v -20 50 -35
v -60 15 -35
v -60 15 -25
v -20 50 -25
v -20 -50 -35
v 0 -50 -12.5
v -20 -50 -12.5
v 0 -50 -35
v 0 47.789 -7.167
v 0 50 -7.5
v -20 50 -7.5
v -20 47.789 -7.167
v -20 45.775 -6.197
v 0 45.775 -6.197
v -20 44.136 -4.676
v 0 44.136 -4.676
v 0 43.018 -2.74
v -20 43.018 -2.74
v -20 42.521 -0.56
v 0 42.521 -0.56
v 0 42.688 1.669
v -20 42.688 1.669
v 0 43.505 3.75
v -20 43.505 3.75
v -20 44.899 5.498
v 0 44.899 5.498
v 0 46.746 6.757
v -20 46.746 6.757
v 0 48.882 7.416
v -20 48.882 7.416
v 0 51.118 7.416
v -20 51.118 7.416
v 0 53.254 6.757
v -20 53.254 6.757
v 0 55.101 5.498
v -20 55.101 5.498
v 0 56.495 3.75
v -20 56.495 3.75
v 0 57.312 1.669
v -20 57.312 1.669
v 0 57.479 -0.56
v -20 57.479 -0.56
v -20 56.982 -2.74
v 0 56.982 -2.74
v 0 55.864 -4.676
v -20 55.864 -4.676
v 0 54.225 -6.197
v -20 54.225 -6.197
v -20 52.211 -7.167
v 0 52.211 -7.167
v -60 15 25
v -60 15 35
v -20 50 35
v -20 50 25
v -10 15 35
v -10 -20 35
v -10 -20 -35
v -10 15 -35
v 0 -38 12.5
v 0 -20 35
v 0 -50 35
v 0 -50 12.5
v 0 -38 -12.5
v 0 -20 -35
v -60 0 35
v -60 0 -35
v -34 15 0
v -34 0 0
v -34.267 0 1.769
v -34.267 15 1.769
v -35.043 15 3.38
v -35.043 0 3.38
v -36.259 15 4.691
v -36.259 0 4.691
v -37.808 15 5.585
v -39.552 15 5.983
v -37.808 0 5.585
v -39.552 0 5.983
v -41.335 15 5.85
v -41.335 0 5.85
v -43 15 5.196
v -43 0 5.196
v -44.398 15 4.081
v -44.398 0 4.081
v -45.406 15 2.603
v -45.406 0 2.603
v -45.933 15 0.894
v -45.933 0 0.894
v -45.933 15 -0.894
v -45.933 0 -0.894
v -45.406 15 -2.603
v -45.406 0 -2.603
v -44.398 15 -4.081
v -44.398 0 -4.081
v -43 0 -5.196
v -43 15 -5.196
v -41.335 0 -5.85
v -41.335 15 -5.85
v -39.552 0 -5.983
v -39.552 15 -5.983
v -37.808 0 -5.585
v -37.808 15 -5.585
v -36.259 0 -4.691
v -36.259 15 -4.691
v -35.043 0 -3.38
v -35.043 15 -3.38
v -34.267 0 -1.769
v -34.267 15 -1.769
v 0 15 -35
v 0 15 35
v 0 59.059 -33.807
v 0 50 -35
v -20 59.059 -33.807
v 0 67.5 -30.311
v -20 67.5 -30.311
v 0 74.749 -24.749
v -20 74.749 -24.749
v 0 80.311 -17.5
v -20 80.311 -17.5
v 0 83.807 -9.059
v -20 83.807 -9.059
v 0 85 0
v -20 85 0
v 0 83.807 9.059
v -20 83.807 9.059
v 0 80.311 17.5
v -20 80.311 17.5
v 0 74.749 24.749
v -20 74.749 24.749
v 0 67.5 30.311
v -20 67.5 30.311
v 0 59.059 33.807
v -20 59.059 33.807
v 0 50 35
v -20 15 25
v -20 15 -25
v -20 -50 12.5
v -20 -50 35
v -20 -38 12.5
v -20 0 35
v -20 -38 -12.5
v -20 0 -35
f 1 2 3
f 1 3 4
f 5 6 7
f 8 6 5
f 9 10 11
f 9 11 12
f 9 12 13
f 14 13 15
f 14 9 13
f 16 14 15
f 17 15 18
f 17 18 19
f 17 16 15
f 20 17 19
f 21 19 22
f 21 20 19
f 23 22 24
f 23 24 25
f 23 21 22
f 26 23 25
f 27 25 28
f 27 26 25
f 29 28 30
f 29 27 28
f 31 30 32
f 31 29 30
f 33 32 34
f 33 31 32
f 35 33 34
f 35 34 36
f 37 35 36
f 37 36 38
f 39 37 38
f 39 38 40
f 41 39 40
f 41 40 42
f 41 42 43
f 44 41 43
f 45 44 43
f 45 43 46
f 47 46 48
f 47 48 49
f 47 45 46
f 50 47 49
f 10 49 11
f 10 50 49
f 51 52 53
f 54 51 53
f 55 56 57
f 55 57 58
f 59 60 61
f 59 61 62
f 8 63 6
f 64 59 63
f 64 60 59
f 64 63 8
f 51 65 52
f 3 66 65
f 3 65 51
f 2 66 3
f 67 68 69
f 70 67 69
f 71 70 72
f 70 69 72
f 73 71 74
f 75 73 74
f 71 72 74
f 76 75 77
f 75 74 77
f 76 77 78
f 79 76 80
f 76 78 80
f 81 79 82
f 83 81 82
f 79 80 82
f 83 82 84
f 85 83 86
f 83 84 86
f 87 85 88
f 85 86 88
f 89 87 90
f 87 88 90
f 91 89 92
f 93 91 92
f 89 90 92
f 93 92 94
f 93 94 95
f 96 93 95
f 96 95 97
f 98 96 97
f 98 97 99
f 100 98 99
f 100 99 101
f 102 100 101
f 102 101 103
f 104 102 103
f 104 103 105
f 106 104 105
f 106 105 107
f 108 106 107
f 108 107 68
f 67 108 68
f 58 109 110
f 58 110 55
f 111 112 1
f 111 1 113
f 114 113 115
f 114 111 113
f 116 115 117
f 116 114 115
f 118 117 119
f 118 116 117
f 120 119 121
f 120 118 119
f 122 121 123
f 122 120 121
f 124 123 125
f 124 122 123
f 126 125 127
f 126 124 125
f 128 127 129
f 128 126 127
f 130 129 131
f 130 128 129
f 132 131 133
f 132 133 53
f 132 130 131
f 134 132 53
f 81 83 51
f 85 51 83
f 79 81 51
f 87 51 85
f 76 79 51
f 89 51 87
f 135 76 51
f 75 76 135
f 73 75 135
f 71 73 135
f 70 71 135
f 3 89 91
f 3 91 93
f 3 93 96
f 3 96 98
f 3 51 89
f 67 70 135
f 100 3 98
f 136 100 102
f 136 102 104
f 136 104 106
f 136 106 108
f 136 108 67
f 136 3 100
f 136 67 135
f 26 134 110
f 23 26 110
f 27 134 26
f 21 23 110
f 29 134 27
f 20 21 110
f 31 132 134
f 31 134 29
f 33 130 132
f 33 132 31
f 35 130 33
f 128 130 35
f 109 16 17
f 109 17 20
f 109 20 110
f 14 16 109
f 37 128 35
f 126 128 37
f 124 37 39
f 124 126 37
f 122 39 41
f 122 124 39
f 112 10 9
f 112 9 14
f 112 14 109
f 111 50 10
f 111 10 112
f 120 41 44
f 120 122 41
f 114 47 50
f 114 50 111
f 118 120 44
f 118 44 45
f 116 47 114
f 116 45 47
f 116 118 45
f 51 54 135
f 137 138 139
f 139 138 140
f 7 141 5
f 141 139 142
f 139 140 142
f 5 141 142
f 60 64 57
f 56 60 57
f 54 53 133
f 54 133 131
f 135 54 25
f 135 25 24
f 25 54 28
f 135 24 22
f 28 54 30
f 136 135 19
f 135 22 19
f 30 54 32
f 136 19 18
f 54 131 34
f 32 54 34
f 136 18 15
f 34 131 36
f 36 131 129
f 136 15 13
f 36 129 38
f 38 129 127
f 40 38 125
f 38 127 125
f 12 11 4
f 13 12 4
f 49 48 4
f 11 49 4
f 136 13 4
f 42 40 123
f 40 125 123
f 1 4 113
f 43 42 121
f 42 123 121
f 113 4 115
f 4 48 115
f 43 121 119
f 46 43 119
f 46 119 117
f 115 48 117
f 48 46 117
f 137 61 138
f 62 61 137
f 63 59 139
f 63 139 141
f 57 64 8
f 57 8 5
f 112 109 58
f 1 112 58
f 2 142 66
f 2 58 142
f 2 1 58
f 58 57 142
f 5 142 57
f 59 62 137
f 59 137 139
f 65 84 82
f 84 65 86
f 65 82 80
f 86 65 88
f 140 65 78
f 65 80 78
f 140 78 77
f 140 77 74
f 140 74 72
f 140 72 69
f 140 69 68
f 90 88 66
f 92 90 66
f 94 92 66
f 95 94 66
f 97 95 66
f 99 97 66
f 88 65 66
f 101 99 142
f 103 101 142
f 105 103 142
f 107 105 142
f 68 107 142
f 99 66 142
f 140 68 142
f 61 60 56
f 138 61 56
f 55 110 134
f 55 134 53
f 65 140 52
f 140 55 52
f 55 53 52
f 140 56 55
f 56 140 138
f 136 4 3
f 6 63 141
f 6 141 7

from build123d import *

# Parameters (mm, degrees)
EXTRUDE_1_DEPTH     = 20
SKETCH_2_W          = 10
SKETCH_2_H          = 35
CUT_EXTRUDE_1_DEPTH = 112.915146428
EXTRUDE_START       = -35
SKETCH_3_W          = 40
SKETCH_3_H          = 15
EXTRUDE_2_DEPTH     = 70
SKETCH_4_R          = 6
CUT_EXTRUDE_2_DEPTH = 110.772492001
EXTRUDE_3_DEPTH     = 10


with BuildPart() as part:
    # Эскиз1 → Бобышка-Вытянуть1 (new body)
    with BuildSketch(Plane(origin=(0, 0, 0), x_dir=(0, 0, -1), z_dir=(1, 0, 0))):
        with BuildLine():
            Line((-35, 50), (-35, -50))
            Line((-35, -50), (-12.5, -50))
            Line((-12.5, -50), (-12.5, -38))
            Line((-12.5, -38), (12.5, -38))
            Line((12.5, -38), (12.5, -50))
            Line((12.5, -50), (35, -50))
            Line((35, -50), (35, 50))
            ThreePointArc((35, 50), (0, 15), (-35, 50))
        make_face()
        with BuildLine():
            ThreePointArc((35, 50), (0, 85), (-35, 50))
            Line((-35, 50), (-7.5, 50))
            ThreePointArc((-7.5, 50), (0, 57.5), (7.5, 50))
            Line((7.5, 50), (35, 50))
        make_face()
        with BuildLine():
            Line((-7.5, 50), (-35, 50))
            ThreePointArc((-35, 50), (0, 15), (35, 50))
            Line((35, 50), (7.5, 50))
            ThreePointArc((7.5, 50), (0, 42.5), (-7.5, 50))
        make_face()
    extrude(amount=-EXTRUDE_1_DEPTH)

    # Эскиз2 → Вырез-Вытянуть1 (cut, through all)
    with BuildSketch(Plane(origin=(0, 0, -35), x_dir=(-1, 0, 0), z_dir=(0, 0, -1))):
        with Locations((5, -2.5)):
            Rectangle(SKETCH_2_W, SKETCH_2_H)
    extrude(amount=-CUT_EXTRUDE_1_DEPTH, mode=Mode.SUBTRACT)

    # Эскиз3 → Бобышка-Вытянуть2 (add)
    with BuildSketch(Plane.XY.offset(EXTRUDE_START)):
        with Locations((-40, 7.5)):
            Rectangle(SKETCH_3_W, SKETCH_3_H)
    extrude(amount=EXTRUDE_2_DEPTH)

    # Эскиз4 → Вырез-Вытянуть2 (cut, through all)
    with BuildSketch(Plane.XZ):
        with Locations((-40, 0)):
            Circle(SKETCH_4_R)
    extrude(amount=-CUT_EXTRUDE_2_DEPTH, mode=Mode.SUBTRACT)

    # Эскиз5 → Бобышка-Вытянуть3 (add)
    with BuildSketch(Plane.XY.offset(35)):
        Polygon((-60, 15), (-20, 50), (-20, 15), align=None)
    extrude_3 = extrude(amount=-EXTRUDE_3_DEPTH)

    # Зеркальное отражение1: Бобышка-Вытянуть3 across plane
    add(extrude_3.mirror(Plane.XY))


solid = part.part
